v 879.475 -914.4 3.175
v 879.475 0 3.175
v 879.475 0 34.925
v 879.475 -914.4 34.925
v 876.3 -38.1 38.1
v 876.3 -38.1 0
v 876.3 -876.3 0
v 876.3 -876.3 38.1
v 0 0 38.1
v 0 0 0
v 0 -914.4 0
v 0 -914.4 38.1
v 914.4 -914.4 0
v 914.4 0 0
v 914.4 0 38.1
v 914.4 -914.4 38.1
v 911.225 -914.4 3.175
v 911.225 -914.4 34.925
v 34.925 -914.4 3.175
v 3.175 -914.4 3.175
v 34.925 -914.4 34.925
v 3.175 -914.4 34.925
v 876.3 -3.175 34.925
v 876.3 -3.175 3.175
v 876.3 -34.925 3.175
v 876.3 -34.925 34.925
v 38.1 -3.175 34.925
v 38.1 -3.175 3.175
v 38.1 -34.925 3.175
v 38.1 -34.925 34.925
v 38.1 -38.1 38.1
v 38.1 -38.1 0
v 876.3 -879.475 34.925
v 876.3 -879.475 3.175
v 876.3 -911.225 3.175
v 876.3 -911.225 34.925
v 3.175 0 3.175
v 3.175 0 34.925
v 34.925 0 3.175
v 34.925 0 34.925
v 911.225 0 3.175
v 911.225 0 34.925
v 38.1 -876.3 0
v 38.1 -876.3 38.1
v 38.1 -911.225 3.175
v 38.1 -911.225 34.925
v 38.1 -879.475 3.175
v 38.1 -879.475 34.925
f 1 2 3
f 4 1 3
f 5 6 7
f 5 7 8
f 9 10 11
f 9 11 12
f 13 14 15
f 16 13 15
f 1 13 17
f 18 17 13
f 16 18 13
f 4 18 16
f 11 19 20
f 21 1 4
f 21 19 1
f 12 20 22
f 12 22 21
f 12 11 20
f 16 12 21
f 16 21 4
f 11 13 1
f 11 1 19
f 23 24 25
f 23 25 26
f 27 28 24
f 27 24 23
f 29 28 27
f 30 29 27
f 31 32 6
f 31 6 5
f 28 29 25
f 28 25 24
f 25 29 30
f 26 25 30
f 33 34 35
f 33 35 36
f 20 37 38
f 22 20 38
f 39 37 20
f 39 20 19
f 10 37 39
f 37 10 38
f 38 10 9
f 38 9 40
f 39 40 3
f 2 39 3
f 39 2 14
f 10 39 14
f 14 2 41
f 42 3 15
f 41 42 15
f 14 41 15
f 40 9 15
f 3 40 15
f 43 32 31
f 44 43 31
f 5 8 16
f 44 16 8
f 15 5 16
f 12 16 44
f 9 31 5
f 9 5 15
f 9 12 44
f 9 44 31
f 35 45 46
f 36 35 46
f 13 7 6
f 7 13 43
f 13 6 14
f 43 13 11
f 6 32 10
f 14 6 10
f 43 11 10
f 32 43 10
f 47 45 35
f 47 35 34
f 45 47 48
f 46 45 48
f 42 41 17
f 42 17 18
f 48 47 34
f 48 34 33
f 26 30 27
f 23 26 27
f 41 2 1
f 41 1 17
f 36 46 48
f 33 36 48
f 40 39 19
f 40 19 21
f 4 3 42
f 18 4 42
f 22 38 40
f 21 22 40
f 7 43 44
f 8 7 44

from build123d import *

# Parameters (mm, degrees)
F0_W     = 38.1
F0_H     = 38.1
F0_W_2   = 31.75
F0_H_2   = 31.75
F1_DEPTH = 914.4
F2_W     = 38.1
F2_H     = 38.1
F2_W_2   = 31.75
F2_H_2   = 31.75
F3_DEPTH = 838.2


with BuildPart() as f1:
    # F0 (on Front) → F1 (new body)
    with BuildSketch(Plane.XZ):
        with Locations((19.05, 19.05)):
            Rectangle(F0_W, F0_H)
        with Locations((19.05, 19.05)):
            Rectangle(F0_W_2, F0_H_2, mode=Mode.SUBTRACT)
        with Locations((895.35, 19.05)):
            Rectangle(F0_W, F0_H)
        with Locations((895.35, 19.05)):
            Rectangle(F0_W_2, F0_H_2, mode=Mode.SUBTRACT)
    extrude(amount=F1_DEPTH)

    # F2 (on face) → F3 (join)
    with BuildSketch(Plane.YZ.offset(38.1)):
        with Locations((-895.35, 19.05)):
            Rectangle(F2_W, F2_H)
        with Locations((-895.35, 19.05)):
            Rectangle(F2_W_2, F2_H_2, mode=Mode.SUBTRACT)
        with Locations((-19.05, 19.05)):
            Rectangle(F2_W, F2_H)
        with Locations((-19.05, 19.05)):
            Rectangle(F2_W_2, F2_H_2, mode=Mode.SUBTRACT)
    extrude(amount=F3_DEPTH)


solid = f1.part
